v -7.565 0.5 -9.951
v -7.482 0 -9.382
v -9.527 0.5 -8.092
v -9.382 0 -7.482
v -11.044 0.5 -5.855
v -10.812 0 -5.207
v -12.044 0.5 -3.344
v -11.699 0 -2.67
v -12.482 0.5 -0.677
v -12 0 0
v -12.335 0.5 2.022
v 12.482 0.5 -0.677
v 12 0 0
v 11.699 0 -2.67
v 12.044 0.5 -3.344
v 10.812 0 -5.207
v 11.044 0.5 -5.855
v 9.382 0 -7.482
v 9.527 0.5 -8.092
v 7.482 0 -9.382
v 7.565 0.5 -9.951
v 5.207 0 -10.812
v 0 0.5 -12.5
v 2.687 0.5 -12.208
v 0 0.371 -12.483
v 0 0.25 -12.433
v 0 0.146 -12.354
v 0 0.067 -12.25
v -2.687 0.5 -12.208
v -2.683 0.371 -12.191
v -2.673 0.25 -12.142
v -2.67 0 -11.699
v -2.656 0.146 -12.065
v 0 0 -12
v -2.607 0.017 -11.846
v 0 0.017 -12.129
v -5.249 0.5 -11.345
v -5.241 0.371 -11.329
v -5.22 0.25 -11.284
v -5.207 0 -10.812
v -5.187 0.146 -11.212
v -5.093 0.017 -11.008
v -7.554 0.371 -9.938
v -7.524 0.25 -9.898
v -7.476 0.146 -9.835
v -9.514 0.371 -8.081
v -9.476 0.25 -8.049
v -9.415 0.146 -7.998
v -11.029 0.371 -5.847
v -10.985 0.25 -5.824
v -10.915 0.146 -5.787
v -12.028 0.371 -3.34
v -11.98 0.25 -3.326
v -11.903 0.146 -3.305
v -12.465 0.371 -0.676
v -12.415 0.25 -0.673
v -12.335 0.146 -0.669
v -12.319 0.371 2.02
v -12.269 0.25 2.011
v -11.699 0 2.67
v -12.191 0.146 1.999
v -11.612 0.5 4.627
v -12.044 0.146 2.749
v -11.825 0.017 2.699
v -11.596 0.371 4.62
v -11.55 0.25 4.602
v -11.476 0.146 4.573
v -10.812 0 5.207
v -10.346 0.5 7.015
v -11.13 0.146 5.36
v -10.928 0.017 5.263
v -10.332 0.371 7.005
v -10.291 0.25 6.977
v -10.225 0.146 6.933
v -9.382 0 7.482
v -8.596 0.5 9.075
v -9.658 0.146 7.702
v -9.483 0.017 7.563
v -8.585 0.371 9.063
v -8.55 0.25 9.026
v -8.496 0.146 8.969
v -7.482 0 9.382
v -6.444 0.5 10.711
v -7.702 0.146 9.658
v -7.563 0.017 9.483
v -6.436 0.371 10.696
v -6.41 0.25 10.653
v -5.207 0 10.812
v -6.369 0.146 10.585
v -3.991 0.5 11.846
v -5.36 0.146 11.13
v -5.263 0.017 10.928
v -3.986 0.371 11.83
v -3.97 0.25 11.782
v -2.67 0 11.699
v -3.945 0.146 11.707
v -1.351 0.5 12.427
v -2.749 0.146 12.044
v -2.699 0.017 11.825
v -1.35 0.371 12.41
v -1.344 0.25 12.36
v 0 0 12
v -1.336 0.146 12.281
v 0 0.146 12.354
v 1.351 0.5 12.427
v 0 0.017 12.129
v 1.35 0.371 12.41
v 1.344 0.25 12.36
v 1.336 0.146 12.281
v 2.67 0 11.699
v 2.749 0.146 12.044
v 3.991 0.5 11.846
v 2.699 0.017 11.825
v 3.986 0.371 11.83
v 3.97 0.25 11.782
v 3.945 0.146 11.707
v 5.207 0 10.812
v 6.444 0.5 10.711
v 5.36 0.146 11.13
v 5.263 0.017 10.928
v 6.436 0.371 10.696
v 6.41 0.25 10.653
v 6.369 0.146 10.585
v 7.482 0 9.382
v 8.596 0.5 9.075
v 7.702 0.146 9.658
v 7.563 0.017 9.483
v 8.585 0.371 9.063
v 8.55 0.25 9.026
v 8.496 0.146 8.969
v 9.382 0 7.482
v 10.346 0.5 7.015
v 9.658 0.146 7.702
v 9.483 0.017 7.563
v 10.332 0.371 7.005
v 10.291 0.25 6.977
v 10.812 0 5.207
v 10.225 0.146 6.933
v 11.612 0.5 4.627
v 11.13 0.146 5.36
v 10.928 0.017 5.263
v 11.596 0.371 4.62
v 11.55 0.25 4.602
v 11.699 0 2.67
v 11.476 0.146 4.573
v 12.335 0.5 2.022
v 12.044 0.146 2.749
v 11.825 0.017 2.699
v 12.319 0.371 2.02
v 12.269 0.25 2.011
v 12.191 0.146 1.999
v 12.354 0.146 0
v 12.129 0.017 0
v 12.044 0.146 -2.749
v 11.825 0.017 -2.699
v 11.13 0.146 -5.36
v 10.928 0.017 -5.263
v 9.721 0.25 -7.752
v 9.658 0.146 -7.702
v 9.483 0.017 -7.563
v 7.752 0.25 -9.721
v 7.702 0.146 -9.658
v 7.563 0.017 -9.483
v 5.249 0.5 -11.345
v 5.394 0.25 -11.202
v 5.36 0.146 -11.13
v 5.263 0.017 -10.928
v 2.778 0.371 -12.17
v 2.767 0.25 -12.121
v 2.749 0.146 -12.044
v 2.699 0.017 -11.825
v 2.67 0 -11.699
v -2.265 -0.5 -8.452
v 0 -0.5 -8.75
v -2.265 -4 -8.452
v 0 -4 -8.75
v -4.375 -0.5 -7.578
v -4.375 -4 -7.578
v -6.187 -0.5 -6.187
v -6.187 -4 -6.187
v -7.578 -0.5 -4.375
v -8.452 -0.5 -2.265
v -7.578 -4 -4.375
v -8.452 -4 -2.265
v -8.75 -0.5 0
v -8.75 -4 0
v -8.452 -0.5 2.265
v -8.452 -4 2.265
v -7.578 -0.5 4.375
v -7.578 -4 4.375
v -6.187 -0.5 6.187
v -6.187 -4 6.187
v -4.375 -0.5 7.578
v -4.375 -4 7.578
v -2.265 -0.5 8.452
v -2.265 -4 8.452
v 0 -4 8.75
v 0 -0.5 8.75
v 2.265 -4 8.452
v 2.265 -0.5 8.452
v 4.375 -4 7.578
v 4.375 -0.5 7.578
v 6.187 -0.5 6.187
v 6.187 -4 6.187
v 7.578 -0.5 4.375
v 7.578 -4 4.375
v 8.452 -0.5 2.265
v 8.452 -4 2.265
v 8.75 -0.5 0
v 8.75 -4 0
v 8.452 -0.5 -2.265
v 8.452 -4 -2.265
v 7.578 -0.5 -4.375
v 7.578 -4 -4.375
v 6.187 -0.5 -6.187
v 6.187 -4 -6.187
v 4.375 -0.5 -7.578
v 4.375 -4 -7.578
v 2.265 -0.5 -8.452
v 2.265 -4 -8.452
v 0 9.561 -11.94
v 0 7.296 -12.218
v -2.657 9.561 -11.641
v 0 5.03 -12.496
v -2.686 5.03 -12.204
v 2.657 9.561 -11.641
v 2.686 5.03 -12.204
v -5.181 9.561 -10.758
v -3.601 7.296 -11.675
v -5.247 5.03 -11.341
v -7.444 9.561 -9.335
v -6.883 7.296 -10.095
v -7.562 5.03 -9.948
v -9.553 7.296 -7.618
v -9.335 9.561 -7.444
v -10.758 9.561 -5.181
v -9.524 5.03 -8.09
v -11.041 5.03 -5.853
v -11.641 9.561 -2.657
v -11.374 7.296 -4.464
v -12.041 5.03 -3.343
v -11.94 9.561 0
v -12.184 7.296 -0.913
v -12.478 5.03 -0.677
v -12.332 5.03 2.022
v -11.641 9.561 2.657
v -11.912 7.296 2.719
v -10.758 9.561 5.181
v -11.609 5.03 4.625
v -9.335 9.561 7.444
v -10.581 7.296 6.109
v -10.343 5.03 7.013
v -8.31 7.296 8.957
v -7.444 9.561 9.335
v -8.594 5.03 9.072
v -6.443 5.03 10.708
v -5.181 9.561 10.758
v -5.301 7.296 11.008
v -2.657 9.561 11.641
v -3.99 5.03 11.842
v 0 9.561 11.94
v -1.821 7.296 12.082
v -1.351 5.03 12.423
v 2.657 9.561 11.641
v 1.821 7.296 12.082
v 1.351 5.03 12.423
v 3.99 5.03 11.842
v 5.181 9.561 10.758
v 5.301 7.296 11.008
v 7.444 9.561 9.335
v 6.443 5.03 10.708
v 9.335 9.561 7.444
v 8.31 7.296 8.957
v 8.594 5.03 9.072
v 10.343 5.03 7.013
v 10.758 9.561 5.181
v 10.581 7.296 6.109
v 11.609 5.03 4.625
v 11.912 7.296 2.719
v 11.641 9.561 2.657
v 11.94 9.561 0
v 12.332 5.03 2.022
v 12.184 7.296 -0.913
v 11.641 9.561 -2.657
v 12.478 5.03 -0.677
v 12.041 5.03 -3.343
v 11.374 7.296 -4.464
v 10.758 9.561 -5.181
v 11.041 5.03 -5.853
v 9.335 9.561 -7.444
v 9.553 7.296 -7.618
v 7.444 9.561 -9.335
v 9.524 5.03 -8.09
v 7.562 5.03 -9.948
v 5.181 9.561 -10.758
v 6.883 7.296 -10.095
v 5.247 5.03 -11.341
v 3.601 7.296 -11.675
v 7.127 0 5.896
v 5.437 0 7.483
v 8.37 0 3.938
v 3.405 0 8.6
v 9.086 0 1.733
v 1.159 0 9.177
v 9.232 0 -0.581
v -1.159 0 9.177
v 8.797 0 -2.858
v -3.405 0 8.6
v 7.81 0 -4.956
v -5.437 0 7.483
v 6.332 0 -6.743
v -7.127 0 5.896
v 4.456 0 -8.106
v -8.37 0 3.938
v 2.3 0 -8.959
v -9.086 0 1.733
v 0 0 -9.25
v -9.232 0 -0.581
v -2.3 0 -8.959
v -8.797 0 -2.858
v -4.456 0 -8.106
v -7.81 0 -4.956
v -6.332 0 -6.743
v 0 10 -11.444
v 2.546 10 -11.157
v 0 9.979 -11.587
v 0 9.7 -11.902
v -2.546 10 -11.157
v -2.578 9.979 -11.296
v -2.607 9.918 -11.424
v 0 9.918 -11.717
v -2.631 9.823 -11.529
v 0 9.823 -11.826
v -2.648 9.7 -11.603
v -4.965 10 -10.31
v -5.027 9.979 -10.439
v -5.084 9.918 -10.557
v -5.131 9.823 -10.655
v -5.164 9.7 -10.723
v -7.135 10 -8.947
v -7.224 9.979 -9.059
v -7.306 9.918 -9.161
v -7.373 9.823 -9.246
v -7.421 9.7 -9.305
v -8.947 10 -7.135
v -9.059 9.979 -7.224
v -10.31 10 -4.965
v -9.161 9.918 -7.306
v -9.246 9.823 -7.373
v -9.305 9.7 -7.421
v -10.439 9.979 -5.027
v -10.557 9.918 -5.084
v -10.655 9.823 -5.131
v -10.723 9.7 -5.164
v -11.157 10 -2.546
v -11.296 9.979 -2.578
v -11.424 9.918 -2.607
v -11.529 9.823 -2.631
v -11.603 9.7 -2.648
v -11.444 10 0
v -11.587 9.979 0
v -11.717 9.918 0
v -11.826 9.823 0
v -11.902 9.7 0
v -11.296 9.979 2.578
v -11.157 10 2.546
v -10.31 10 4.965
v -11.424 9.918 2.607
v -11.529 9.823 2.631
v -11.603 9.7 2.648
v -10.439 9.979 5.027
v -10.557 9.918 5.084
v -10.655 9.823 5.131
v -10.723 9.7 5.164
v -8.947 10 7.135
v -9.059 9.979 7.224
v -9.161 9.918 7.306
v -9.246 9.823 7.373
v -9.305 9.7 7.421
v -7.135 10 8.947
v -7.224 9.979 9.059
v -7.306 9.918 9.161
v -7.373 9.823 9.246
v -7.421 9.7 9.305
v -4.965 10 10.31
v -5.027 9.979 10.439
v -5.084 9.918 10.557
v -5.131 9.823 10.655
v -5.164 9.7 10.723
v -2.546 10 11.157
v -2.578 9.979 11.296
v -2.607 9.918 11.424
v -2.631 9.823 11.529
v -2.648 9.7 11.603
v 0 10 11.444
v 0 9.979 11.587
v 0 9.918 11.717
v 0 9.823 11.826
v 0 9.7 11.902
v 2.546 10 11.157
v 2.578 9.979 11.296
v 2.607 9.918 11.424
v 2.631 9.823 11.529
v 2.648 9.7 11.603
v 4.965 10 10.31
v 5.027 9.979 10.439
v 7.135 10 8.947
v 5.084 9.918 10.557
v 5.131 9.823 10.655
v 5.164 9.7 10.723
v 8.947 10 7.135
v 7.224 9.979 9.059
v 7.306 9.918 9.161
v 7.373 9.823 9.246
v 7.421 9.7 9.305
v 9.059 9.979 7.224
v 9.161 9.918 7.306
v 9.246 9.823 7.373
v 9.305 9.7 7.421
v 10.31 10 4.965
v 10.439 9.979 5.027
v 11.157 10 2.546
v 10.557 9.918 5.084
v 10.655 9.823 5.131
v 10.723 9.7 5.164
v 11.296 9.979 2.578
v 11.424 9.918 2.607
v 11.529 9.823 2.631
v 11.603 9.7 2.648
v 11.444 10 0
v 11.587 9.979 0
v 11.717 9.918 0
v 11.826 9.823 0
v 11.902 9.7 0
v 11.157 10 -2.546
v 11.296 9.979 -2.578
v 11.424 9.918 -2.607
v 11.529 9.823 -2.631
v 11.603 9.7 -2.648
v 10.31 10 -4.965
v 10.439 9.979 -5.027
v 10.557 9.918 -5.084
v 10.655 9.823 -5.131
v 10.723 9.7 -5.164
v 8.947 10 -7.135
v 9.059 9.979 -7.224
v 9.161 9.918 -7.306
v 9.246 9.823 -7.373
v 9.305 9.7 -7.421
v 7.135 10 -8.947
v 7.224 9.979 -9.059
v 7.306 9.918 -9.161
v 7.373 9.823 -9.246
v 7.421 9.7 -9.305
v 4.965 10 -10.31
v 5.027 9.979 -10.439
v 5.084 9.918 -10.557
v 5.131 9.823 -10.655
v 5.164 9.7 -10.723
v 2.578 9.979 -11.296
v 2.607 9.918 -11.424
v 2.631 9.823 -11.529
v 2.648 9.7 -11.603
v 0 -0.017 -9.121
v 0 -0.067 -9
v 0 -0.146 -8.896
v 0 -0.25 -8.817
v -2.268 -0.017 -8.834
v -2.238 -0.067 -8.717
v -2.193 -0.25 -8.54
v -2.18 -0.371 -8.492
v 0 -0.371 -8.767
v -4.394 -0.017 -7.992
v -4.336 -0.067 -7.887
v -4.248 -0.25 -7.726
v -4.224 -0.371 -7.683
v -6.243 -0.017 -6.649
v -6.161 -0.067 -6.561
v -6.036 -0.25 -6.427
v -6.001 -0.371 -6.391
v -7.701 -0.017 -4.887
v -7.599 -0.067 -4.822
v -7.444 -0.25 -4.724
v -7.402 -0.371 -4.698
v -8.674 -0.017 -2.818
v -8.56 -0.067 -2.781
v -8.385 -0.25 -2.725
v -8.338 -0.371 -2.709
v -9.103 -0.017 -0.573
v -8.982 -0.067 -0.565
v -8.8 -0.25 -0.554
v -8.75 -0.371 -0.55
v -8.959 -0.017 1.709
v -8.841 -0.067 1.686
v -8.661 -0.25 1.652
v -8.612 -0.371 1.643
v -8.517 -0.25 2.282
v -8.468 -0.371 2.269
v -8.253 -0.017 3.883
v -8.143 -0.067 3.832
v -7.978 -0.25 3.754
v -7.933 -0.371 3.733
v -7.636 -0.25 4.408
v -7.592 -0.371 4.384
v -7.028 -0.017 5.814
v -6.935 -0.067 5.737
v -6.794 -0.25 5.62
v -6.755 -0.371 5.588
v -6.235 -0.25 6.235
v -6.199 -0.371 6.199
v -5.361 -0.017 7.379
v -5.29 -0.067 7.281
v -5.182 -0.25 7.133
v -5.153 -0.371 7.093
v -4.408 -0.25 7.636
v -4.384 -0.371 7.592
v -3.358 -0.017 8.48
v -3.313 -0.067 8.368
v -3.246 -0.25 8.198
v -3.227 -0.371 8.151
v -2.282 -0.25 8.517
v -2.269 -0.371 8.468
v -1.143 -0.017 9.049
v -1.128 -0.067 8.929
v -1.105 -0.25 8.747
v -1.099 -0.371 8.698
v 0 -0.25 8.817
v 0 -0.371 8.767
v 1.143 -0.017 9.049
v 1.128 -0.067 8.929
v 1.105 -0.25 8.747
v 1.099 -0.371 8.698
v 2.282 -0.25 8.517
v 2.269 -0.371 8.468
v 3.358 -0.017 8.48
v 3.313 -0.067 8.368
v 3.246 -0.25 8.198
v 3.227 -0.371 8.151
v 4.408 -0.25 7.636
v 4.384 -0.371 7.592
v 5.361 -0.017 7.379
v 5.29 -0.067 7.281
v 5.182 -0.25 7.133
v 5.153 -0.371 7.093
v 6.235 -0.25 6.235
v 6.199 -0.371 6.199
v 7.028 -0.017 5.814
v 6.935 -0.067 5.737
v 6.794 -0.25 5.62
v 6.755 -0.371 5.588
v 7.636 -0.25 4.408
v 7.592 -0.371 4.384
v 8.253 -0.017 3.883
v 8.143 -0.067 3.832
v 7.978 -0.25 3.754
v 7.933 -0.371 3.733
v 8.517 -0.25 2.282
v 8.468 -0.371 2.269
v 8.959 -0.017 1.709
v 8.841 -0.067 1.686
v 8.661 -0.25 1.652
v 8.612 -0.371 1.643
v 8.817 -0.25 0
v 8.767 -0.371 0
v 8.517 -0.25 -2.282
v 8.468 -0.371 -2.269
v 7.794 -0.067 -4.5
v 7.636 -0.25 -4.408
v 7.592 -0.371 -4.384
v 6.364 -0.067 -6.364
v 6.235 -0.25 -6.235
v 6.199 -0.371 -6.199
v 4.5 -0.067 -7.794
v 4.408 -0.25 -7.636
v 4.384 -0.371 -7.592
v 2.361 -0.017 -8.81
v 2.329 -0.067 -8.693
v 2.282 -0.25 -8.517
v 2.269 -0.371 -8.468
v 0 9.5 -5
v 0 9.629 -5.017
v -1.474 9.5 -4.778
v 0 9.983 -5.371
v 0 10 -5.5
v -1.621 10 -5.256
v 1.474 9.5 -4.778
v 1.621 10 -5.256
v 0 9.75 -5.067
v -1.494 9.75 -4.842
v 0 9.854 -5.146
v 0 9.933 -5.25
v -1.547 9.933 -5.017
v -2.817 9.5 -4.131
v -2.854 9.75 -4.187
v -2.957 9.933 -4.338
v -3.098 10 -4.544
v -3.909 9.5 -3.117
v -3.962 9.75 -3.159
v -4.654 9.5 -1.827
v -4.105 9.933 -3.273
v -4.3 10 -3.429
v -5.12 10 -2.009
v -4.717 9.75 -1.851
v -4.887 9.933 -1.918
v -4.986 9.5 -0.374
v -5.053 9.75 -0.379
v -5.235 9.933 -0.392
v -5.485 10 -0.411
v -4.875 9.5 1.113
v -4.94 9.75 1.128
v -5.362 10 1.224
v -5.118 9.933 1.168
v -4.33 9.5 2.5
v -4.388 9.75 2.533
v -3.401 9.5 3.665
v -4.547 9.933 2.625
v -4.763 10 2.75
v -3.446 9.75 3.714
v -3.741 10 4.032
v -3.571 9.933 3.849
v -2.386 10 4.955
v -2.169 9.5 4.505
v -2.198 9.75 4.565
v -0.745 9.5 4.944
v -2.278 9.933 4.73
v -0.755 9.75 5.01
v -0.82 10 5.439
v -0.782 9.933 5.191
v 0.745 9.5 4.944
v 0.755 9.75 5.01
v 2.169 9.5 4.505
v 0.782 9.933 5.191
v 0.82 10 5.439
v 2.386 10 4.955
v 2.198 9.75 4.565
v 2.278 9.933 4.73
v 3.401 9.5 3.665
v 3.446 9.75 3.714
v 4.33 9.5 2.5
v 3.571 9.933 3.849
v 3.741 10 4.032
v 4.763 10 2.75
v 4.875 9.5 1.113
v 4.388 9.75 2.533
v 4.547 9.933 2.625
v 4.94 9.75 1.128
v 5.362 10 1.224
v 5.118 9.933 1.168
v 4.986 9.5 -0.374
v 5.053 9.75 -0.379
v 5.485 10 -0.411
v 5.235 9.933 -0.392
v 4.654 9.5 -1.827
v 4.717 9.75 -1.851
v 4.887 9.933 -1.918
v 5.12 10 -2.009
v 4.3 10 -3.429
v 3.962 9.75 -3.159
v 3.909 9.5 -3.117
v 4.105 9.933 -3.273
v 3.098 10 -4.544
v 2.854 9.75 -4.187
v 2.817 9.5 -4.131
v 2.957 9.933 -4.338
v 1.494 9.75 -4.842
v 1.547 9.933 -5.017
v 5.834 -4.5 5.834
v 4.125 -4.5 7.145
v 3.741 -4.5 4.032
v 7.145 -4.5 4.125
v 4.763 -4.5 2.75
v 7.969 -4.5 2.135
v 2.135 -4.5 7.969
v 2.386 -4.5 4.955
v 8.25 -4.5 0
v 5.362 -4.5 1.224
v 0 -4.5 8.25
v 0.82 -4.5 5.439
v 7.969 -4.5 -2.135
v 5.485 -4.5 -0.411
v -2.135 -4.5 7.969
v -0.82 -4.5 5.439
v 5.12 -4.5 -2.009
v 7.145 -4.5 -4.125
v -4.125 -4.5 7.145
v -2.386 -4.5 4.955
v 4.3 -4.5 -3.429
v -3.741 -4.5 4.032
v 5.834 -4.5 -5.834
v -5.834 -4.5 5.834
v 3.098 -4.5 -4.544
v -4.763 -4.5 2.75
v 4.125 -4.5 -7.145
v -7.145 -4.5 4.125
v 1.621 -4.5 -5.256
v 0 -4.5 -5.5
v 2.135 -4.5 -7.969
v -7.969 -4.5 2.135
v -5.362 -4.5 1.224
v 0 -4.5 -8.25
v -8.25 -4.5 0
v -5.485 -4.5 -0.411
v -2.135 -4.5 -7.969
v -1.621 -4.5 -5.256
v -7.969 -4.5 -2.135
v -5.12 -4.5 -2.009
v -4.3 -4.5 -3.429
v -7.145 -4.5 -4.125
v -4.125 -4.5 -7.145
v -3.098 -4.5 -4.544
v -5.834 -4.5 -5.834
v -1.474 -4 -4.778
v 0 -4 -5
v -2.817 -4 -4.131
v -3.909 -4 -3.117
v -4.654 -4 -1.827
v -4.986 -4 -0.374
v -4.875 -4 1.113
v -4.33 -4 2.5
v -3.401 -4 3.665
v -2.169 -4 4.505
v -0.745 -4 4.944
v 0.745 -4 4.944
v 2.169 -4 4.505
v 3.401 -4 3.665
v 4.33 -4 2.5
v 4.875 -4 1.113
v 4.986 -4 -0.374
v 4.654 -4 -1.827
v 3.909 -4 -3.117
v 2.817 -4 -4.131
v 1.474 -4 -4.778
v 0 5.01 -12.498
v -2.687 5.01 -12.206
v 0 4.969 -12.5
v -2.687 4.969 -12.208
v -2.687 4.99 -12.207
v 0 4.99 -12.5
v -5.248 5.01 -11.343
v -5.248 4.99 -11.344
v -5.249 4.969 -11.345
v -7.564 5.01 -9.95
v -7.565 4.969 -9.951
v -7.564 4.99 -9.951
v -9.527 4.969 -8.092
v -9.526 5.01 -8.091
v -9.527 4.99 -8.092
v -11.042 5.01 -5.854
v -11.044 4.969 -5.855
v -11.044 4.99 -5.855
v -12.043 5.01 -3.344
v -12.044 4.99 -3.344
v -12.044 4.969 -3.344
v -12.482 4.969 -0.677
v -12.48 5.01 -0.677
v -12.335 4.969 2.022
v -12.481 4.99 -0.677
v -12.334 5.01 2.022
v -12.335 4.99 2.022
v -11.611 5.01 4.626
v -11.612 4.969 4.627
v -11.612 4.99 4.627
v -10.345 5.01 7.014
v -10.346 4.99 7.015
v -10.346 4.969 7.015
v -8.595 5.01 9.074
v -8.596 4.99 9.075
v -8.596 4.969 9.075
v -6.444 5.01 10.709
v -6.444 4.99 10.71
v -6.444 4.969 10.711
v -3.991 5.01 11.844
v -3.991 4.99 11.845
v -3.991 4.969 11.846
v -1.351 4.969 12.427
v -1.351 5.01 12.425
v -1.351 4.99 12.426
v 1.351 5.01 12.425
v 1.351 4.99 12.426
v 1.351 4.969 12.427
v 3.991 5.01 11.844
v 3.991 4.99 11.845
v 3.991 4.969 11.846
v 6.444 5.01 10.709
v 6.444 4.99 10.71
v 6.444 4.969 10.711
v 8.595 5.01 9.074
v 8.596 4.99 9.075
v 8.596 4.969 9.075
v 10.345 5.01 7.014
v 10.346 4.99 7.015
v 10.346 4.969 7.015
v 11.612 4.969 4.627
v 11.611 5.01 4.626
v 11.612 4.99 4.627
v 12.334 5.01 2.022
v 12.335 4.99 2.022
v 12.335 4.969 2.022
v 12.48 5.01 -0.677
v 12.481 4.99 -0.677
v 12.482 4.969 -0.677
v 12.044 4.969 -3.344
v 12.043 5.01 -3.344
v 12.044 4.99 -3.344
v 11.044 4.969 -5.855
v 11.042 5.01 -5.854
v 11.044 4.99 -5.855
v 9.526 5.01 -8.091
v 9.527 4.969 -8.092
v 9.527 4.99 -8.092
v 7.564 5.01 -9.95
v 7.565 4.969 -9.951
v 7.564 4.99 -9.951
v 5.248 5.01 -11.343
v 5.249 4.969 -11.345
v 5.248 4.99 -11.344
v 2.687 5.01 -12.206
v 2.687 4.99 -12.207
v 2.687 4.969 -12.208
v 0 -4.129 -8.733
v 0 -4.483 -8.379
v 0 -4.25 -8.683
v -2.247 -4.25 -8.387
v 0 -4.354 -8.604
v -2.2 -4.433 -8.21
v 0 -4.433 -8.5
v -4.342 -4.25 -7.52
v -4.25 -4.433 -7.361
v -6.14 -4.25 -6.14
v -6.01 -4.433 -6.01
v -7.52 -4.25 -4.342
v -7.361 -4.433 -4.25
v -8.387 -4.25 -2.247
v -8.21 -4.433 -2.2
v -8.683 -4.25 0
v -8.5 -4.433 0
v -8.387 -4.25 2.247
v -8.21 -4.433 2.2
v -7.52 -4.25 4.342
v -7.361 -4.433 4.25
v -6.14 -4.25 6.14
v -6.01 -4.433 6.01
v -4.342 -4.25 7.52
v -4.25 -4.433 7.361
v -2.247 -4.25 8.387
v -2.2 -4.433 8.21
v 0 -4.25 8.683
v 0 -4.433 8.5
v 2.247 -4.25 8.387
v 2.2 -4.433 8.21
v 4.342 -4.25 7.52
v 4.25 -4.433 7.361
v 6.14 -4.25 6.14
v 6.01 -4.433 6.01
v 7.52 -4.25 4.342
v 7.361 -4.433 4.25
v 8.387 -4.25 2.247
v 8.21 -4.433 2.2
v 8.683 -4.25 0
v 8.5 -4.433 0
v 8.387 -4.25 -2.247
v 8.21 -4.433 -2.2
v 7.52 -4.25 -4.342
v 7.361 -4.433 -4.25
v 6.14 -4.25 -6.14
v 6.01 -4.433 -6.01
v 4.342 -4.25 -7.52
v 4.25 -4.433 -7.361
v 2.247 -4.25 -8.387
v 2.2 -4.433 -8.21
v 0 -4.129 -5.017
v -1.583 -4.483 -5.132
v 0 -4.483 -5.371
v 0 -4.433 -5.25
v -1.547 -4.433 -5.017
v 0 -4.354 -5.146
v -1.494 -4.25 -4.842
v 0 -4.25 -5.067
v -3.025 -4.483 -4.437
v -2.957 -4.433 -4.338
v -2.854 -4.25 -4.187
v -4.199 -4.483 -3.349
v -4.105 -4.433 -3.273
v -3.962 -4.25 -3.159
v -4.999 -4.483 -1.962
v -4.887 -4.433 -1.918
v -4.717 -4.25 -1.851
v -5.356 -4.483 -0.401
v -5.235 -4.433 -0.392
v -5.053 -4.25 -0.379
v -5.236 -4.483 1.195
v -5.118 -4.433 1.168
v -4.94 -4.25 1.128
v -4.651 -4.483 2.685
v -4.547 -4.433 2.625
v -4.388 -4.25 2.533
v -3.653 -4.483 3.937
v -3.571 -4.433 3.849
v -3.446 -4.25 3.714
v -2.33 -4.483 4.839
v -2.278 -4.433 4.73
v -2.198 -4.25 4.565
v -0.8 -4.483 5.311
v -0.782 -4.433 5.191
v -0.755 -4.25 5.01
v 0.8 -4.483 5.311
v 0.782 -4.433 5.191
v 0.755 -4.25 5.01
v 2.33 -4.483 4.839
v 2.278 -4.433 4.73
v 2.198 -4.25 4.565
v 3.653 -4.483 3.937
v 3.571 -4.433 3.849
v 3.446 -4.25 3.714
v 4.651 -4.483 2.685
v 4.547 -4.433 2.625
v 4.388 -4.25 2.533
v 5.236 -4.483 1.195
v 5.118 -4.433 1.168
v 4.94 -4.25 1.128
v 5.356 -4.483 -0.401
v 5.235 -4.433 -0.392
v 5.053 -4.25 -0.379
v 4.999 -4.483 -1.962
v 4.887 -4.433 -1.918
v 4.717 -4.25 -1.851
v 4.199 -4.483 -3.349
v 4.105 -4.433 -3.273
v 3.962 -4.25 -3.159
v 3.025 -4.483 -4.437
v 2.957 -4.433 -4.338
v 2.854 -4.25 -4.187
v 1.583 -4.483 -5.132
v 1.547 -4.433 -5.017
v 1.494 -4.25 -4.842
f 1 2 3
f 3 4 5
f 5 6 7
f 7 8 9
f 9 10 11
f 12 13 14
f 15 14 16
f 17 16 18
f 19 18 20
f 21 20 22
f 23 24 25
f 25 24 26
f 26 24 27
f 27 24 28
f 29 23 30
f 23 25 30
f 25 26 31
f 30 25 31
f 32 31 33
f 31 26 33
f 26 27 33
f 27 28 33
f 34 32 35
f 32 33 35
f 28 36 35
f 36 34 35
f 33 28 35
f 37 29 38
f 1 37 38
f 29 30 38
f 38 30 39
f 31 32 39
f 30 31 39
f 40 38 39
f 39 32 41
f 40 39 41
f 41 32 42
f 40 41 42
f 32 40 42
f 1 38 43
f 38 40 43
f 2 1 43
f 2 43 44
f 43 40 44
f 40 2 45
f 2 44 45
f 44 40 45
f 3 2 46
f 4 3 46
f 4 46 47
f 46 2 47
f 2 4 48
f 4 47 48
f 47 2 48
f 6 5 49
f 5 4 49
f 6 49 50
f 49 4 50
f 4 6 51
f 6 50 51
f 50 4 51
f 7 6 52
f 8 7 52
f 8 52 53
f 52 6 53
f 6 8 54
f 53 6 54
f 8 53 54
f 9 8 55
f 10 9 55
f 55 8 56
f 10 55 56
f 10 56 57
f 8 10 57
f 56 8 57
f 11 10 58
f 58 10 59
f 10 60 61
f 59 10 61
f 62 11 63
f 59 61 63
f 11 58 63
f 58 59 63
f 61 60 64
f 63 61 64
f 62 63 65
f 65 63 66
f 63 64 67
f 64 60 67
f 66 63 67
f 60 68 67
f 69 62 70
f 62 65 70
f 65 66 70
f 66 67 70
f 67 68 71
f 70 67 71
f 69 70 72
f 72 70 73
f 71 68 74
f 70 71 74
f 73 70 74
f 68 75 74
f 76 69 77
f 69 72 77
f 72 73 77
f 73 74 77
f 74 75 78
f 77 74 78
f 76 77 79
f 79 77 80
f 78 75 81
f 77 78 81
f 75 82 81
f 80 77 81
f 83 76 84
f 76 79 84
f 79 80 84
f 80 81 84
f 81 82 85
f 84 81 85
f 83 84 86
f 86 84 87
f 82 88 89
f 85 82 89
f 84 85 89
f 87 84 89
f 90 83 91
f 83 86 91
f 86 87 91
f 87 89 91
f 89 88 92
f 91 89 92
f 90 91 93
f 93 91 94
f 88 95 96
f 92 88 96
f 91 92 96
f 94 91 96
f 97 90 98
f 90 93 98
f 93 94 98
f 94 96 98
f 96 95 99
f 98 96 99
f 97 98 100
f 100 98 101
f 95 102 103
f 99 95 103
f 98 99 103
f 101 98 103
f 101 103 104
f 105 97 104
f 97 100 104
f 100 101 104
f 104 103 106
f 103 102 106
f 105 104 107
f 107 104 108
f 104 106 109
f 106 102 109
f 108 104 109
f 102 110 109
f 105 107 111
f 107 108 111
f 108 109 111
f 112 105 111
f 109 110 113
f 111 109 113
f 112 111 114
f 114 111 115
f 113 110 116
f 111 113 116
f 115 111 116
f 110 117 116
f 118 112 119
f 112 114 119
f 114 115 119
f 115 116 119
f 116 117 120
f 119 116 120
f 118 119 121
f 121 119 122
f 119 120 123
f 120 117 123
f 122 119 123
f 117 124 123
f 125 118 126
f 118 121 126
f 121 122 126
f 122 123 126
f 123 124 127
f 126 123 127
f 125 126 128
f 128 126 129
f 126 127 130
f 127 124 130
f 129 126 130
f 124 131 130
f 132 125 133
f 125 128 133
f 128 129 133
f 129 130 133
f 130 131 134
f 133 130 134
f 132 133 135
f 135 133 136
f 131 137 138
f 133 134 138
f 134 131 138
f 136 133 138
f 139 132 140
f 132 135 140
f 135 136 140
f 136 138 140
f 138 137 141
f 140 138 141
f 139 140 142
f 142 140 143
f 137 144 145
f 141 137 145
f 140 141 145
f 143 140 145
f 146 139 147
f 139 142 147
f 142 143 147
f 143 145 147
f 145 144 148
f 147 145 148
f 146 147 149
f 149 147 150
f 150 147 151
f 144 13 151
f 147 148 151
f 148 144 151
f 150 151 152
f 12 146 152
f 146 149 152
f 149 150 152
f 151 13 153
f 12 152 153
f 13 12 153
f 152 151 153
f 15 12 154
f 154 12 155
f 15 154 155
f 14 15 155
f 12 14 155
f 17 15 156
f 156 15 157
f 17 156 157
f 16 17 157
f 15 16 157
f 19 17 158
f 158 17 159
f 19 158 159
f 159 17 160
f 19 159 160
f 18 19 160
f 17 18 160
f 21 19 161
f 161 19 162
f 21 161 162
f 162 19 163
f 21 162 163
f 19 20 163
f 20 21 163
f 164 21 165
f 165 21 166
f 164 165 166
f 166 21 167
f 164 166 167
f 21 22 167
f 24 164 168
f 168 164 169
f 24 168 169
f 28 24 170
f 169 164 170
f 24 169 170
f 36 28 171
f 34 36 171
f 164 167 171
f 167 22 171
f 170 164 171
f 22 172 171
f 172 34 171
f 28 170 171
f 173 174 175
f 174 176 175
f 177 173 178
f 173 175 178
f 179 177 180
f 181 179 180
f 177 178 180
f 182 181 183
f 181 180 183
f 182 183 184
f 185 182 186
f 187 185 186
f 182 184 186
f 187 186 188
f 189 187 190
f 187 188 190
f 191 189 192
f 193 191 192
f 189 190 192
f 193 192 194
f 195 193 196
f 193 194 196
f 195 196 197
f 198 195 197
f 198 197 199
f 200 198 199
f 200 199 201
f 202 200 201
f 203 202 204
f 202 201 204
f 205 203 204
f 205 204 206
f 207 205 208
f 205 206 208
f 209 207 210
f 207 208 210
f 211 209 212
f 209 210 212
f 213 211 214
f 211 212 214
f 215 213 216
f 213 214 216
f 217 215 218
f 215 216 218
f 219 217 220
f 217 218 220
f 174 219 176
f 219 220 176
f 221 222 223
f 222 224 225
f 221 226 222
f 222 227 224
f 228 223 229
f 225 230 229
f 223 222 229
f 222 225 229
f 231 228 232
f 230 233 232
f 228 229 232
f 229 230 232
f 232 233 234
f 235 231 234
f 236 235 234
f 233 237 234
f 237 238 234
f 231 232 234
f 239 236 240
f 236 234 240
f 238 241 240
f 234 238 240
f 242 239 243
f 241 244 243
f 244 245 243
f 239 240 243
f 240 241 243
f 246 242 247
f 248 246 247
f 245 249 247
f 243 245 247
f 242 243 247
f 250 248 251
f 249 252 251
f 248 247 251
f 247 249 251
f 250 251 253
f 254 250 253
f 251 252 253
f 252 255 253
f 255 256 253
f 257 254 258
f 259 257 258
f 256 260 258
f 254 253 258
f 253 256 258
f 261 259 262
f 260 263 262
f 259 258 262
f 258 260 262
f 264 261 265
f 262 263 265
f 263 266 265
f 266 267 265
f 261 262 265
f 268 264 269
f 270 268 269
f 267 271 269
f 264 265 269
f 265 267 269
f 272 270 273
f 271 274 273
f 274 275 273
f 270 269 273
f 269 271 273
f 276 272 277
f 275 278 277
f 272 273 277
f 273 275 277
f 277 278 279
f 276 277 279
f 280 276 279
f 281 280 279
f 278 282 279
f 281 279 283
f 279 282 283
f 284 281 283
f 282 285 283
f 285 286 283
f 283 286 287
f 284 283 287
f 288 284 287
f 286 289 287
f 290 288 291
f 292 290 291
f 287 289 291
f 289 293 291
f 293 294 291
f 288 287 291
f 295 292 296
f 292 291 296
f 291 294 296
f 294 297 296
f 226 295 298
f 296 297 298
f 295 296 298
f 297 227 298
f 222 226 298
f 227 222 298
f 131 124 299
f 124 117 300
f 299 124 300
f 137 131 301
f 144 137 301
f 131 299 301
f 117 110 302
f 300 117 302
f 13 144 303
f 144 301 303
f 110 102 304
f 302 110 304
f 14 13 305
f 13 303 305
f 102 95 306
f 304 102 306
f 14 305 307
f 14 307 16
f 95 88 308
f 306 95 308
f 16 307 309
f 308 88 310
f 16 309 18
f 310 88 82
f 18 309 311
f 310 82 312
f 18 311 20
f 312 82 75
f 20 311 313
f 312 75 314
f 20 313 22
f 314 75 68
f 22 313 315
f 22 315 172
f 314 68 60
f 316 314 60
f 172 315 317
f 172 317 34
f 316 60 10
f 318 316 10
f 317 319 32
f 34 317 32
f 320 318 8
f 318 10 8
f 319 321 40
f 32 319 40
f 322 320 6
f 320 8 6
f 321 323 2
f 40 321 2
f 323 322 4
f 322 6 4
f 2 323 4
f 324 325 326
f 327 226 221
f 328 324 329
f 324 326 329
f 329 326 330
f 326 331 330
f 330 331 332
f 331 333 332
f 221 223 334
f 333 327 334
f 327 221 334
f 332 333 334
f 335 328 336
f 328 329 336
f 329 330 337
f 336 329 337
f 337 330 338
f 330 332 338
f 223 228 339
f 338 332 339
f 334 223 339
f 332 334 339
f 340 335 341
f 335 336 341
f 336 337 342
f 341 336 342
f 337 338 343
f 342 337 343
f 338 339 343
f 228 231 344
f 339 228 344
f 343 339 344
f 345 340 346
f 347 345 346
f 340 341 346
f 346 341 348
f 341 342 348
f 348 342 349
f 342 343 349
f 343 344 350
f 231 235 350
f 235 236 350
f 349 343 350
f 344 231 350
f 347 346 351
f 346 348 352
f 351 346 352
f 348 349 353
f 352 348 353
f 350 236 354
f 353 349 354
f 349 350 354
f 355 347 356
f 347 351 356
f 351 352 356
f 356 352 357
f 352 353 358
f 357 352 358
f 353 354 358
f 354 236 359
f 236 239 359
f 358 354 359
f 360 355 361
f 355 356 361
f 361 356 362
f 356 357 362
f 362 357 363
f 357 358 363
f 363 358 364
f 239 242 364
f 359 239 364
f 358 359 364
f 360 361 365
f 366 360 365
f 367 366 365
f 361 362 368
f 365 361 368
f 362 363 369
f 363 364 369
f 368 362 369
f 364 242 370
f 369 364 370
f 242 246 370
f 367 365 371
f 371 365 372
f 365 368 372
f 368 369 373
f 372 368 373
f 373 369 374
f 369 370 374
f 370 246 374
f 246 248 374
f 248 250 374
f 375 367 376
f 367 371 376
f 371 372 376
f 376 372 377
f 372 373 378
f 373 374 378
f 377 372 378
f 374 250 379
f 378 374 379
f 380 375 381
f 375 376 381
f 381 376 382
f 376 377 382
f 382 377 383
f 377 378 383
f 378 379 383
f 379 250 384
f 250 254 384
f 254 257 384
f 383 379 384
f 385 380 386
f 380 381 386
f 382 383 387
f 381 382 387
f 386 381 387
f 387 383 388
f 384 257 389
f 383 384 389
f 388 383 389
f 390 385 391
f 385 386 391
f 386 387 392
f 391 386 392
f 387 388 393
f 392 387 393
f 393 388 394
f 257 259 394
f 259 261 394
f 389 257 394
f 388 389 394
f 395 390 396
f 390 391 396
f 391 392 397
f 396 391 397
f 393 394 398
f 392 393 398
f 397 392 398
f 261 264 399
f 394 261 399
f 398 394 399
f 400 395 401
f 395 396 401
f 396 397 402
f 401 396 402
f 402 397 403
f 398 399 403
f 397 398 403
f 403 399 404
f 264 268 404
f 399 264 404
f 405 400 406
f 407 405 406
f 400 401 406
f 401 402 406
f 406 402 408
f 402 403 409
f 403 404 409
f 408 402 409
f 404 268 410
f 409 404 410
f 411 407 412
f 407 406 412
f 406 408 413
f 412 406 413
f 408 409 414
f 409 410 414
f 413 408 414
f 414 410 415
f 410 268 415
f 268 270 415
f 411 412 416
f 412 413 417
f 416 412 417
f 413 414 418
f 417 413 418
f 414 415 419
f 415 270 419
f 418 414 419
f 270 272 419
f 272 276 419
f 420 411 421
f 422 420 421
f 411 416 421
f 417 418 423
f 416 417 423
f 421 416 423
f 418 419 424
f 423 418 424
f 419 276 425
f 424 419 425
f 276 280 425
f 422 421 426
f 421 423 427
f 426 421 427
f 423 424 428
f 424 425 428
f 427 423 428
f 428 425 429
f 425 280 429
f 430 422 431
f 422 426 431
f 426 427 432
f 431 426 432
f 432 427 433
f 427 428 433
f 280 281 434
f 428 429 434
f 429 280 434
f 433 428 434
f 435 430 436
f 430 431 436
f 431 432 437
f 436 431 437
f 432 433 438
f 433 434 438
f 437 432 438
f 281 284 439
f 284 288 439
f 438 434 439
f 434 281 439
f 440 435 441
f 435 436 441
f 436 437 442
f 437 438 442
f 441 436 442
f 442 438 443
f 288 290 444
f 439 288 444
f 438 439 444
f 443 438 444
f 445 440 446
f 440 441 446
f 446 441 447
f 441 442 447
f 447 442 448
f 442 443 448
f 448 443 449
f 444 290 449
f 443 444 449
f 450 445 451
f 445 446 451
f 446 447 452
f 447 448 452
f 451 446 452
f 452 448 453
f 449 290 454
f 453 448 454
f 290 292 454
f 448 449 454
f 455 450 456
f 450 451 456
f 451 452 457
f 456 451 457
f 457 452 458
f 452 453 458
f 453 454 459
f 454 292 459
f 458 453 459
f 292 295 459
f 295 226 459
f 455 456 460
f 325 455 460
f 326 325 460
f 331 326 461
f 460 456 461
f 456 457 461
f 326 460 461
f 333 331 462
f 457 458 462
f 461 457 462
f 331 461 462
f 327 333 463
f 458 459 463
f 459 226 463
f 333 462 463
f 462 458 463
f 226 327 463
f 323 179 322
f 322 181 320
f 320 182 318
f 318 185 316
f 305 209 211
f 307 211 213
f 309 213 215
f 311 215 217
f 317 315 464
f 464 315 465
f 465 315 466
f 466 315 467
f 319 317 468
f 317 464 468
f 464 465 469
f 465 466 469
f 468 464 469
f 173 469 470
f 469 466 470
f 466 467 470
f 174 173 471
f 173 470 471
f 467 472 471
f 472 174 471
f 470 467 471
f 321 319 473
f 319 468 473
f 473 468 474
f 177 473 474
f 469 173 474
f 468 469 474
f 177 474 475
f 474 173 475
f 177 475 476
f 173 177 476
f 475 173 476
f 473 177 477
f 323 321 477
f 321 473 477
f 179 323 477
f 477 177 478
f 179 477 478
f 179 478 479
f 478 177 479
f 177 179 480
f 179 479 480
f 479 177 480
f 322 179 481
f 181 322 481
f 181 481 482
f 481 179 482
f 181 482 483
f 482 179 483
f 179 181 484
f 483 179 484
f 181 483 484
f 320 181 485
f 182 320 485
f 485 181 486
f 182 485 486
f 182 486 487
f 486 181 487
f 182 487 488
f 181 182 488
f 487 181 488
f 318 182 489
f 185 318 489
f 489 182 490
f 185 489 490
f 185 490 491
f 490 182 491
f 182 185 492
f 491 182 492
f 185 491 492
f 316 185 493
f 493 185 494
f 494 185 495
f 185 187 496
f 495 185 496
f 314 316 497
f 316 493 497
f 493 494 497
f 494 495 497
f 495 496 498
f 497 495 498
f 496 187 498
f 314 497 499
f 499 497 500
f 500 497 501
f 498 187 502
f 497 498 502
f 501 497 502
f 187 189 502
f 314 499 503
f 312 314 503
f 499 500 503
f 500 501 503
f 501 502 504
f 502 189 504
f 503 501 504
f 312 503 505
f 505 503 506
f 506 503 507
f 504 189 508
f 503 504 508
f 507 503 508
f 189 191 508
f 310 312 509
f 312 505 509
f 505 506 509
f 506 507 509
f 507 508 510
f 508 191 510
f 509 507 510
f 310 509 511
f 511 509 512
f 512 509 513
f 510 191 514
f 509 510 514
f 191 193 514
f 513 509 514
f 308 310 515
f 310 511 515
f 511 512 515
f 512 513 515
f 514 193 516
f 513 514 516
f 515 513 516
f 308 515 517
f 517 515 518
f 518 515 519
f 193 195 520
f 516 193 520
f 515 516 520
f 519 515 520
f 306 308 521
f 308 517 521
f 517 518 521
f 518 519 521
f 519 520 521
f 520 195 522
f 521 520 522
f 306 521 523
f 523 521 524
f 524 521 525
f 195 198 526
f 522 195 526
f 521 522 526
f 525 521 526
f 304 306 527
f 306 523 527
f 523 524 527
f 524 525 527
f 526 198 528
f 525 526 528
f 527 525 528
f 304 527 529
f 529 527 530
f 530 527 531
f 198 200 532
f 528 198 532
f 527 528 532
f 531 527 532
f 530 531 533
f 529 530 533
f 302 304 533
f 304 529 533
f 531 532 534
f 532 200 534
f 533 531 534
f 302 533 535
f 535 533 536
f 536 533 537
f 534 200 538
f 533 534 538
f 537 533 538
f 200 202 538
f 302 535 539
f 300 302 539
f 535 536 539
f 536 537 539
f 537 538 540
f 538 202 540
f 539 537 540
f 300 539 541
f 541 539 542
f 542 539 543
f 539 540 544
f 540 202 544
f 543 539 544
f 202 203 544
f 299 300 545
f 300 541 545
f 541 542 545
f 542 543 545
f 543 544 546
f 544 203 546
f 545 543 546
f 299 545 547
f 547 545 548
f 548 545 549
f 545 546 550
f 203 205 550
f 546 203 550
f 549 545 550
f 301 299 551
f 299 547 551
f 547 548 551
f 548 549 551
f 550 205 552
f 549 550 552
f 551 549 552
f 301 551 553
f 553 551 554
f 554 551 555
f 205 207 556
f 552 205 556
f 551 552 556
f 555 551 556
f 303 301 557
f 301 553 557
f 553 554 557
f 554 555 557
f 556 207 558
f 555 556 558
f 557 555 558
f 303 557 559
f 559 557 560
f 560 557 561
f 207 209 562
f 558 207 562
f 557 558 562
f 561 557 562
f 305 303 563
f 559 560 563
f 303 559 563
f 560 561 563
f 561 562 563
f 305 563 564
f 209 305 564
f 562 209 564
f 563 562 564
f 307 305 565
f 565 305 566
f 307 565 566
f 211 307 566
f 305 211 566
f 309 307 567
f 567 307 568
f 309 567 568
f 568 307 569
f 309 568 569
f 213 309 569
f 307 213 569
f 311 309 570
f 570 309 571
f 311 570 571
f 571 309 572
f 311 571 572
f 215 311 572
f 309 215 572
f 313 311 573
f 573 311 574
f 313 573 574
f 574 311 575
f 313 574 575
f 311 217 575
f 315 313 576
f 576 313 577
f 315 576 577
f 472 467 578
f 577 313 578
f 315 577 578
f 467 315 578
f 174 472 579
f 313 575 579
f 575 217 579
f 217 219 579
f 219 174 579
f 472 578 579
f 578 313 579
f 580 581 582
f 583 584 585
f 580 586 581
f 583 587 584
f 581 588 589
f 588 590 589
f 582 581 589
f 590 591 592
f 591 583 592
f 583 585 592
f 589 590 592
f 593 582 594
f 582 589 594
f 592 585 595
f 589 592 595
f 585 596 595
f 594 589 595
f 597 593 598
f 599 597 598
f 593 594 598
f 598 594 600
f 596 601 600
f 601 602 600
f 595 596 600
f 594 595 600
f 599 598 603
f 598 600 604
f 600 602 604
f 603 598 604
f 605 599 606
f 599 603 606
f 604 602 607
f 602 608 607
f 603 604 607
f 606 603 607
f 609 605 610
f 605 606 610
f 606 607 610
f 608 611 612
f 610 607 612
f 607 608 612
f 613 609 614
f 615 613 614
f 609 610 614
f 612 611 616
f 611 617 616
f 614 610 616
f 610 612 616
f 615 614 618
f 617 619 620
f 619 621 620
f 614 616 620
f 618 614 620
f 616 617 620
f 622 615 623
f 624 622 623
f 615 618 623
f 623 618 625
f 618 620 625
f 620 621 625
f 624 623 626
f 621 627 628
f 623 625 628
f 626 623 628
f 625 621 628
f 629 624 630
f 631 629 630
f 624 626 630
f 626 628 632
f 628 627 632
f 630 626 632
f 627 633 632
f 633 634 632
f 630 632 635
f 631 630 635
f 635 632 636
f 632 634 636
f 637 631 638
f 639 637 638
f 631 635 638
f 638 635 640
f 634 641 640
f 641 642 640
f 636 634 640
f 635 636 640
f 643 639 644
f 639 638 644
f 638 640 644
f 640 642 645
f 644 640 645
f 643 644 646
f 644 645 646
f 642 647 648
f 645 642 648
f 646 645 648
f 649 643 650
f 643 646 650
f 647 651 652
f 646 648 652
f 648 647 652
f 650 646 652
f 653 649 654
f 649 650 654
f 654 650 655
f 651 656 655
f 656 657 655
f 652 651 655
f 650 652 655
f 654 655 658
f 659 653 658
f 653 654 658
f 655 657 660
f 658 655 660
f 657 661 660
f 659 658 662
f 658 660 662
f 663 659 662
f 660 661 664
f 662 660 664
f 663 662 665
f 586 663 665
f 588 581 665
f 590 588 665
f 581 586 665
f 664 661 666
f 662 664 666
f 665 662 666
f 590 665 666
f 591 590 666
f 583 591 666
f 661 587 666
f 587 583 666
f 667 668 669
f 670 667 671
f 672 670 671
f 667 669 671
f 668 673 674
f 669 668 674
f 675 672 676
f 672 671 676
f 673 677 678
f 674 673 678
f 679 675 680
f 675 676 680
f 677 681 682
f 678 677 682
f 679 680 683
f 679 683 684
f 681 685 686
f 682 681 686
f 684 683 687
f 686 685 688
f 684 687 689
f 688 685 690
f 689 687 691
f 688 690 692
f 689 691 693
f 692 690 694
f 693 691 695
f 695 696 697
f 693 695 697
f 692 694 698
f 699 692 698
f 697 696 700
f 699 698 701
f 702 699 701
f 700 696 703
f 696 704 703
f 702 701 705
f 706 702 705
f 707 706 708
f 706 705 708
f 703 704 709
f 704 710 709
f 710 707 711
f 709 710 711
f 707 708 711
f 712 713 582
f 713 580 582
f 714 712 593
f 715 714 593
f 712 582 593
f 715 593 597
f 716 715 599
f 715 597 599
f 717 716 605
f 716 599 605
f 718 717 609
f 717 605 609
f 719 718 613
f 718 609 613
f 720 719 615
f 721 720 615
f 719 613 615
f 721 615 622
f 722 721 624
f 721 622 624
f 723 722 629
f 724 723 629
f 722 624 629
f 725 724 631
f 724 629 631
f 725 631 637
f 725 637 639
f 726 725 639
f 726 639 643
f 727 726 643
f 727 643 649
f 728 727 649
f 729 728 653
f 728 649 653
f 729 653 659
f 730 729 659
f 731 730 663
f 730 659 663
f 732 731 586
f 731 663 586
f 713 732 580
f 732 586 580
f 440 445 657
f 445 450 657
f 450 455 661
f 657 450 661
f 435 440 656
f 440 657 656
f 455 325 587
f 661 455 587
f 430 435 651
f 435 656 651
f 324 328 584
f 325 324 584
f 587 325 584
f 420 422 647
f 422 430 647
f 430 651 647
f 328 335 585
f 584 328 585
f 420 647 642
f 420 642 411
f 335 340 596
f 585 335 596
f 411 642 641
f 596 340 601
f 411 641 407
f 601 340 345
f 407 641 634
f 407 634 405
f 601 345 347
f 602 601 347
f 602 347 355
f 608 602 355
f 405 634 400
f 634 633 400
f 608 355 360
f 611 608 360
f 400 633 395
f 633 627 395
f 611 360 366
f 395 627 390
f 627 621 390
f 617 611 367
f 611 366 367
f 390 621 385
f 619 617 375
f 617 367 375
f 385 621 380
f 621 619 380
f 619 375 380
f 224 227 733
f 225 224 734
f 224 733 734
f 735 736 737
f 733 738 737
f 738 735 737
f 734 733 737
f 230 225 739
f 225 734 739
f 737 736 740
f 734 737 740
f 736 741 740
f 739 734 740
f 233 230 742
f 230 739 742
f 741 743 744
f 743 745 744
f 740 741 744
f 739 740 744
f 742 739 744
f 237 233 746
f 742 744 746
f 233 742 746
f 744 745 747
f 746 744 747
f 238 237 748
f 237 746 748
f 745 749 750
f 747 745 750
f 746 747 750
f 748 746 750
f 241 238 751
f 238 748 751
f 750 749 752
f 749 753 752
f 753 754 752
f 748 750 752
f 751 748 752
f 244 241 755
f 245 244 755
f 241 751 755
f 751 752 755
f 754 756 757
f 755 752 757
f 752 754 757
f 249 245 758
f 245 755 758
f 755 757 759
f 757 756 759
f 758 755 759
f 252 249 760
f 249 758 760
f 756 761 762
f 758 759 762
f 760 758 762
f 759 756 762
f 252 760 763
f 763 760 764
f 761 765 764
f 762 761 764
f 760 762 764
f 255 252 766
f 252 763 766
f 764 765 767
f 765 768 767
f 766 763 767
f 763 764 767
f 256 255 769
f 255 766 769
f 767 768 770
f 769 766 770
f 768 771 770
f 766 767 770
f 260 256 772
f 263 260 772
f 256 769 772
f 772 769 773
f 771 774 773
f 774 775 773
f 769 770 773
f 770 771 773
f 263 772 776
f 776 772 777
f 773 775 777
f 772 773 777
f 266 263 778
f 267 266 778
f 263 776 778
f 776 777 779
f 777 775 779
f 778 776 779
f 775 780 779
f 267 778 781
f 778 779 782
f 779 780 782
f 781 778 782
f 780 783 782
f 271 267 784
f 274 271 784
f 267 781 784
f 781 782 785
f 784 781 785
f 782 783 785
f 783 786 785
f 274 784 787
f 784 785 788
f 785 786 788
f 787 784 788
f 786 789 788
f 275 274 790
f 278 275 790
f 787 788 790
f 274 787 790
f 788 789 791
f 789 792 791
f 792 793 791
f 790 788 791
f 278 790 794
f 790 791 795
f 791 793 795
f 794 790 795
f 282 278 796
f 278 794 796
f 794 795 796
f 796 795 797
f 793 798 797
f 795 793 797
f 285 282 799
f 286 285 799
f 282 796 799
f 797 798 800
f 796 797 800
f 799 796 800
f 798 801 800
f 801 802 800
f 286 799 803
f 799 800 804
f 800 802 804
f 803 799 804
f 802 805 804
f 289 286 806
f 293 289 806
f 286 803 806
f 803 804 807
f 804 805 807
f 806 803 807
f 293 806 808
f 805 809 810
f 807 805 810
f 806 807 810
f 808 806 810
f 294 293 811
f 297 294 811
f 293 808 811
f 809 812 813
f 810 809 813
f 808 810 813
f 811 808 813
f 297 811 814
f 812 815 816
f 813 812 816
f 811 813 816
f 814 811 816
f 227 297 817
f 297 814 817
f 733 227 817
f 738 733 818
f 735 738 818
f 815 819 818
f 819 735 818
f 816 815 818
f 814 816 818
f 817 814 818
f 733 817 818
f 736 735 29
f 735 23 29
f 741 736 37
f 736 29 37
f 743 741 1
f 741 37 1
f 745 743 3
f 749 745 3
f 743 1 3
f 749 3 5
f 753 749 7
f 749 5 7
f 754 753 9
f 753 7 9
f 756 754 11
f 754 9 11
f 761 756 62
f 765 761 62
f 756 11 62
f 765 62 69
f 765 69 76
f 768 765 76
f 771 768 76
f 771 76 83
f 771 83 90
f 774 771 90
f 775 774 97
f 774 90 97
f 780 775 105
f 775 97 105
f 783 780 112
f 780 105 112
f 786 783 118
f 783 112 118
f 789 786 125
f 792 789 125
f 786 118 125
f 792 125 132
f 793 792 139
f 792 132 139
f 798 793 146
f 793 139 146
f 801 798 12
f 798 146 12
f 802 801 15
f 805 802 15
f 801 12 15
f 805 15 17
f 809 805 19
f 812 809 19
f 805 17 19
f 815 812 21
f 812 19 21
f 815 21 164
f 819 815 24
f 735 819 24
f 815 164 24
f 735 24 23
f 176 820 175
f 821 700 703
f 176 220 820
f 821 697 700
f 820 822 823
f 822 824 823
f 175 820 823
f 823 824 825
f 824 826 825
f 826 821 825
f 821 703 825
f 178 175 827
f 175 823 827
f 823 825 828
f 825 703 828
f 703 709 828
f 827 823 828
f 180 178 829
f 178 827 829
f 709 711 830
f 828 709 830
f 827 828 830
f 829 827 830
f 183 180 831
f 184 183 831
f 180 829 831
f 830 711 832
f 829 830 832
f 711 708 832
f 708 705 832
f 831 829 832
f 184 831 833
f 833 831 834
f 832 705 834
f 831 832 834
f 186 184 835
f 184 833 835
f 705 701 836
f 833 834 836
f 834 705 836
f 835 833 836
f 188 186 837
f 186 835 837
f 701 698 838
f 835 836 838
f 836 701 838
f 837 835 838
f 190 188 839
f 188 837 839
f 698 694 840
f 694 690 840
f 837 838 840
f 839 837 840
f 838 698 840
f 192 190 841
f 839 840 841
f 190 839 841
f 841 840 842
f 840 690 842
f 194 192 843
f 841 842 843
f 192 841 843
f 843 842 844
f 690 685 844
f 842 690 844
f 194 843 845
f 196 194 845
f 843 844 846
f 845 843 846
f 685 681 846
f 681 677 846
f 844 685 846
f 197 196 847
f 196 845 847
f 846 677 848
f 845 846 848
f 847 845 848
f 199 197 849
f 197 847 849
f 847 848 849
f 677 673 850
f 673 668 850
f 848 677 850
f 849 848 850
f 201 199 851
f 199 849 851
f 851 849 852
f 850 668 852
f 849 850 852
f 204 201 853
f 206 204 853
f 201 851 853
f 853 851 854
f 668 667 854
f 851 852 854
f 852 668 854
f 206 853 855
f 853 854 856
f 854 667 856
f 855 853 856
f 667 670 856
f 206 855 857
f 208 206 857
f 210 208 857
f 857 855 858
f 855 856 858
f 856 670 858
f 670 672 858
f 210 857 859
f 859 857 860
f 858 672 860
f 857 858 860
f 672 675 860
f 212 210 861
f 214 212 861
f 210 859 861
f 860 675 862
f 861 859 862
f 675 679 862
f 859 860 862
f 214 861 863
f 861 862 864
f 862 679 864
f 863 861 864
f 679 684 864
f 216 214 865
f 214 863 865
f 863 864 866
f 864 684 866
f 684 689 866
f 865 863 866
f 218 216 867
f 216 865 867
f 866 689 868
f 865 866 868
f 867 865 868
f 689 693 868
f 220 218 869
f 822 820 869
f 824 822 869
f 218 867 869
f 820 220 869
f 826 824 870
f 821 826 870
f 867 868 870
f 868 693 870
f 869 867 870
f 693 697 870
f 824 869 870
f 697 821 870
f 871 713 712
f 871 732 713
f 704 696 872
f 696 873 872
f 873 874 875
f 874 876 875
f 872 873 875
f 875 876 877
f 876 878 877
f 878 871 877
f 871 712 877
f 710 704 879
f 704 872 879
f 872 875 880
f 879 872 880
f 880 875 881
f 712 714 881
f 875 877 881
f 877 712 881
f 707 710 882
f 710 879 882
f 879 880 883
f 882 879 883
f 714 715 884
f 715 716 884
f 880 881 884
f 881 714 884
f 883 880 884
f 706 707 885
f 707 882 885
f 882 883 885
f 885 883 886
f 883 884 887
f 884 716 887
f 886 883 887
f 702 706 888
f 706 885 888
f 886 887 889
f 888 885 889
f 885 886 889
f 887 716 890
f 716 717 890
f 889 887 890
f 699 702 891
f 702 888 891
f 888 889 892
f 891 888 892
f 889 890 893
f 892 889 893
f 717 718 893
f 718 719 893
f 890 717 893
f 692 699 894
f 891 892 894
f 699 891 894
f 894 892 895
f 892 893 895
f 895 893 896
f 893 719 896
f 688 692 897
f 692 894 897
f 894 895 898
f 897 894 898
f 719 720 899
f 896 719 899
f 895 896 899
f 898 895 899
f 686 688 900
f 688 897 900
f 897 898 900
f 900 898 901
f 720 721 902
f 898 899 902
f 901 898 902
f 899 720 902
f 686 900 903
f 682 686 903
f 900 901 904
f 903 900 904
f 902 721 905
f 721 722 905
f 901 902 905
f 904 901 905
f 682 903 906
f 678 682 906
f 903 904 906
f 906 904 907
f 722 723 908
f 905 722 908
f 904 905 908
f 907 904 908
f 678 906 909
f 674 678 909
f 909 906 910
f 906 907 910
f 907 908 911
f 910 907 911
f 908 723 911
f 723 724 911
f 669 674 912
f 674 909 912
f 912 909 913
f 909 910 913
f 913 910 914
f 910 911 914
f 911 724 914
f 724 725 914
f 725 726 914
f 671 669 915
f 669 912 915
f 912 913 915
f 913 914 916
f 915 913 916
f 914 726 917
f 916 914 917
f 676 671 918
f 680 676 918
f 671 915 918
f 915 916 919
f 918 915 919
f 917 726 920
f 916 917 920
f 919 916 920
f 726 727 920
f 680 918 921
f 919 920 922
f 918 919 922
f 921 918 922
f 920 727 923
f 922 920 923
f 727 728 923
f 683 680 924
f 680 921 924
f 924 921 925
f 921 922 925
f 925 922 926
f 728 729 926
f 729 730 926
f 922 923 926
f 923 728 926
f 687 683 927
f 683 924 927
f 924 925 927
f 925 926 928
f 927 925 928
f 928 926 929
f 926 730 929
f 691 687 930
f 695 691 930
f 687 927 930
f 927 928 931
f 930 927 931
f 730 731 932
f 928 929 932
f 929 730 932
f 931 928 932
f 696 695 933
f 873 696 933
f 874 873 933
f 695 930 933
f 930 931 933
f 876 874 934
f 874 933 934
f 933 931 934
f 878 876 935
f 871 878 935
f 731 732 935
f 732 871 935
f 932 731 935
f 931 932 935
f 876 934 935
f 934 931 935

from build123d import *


with BuildPart() as part:
    # Sketch1 → Revolve1 (revolve)
    with BuildSketch(Plane.XY, mode=Mode.PRIVATE) as revolve1_sk:
        with BuildLine():
            Line((5.5, 10), (11.443714563, 10))
            ThreePointArc((11.443714563, 10), (11.775024587, 9.87447786), (11.939987639, 9.560934672))
            Line((11.939987639, 9.560934672), (12.496273076, 5.030353362))
            ThreePointArc((12.496273076, 5.030353362), (12.499067399, 4.99994296), (12.5, 4.96941869))
            Line((12.5, 4.96941869), (12.5, 0.5))
            ThreePointArc((12.5, 0.5), (12.353553391, 0.146446609), (12, 0))
            Line((12, 0), (9.25, 0))
            ThreePointArc((9.25, 0), (8.896446609, -0.146446609), (8.75, -0.5))
            Line((8.75, -0.5), (8.75, -4))
            ThreePointArc((8.75, -4), (8.603553391, -4.353553391), (8.25, -4.5))
            Line((8.25, -4.5), (5.5, -4.5))
            ThreePointArc((5.5, -4.5), (5.146446609, -4.353553391), (5, -4))
            Line((5, -4), (5, 9.5))
            ThreePointArc((5, 9.5), (5.146446609, 9.853553391), (5.5, 10))
        make_face()
    revolve(revolve1_sk.sketch.rotate(Axis((0, 0, 0), (0, 1, 0)), 90), axis=Axis((0, 0, 0), (0, 1, 0)))


solid = part.part
